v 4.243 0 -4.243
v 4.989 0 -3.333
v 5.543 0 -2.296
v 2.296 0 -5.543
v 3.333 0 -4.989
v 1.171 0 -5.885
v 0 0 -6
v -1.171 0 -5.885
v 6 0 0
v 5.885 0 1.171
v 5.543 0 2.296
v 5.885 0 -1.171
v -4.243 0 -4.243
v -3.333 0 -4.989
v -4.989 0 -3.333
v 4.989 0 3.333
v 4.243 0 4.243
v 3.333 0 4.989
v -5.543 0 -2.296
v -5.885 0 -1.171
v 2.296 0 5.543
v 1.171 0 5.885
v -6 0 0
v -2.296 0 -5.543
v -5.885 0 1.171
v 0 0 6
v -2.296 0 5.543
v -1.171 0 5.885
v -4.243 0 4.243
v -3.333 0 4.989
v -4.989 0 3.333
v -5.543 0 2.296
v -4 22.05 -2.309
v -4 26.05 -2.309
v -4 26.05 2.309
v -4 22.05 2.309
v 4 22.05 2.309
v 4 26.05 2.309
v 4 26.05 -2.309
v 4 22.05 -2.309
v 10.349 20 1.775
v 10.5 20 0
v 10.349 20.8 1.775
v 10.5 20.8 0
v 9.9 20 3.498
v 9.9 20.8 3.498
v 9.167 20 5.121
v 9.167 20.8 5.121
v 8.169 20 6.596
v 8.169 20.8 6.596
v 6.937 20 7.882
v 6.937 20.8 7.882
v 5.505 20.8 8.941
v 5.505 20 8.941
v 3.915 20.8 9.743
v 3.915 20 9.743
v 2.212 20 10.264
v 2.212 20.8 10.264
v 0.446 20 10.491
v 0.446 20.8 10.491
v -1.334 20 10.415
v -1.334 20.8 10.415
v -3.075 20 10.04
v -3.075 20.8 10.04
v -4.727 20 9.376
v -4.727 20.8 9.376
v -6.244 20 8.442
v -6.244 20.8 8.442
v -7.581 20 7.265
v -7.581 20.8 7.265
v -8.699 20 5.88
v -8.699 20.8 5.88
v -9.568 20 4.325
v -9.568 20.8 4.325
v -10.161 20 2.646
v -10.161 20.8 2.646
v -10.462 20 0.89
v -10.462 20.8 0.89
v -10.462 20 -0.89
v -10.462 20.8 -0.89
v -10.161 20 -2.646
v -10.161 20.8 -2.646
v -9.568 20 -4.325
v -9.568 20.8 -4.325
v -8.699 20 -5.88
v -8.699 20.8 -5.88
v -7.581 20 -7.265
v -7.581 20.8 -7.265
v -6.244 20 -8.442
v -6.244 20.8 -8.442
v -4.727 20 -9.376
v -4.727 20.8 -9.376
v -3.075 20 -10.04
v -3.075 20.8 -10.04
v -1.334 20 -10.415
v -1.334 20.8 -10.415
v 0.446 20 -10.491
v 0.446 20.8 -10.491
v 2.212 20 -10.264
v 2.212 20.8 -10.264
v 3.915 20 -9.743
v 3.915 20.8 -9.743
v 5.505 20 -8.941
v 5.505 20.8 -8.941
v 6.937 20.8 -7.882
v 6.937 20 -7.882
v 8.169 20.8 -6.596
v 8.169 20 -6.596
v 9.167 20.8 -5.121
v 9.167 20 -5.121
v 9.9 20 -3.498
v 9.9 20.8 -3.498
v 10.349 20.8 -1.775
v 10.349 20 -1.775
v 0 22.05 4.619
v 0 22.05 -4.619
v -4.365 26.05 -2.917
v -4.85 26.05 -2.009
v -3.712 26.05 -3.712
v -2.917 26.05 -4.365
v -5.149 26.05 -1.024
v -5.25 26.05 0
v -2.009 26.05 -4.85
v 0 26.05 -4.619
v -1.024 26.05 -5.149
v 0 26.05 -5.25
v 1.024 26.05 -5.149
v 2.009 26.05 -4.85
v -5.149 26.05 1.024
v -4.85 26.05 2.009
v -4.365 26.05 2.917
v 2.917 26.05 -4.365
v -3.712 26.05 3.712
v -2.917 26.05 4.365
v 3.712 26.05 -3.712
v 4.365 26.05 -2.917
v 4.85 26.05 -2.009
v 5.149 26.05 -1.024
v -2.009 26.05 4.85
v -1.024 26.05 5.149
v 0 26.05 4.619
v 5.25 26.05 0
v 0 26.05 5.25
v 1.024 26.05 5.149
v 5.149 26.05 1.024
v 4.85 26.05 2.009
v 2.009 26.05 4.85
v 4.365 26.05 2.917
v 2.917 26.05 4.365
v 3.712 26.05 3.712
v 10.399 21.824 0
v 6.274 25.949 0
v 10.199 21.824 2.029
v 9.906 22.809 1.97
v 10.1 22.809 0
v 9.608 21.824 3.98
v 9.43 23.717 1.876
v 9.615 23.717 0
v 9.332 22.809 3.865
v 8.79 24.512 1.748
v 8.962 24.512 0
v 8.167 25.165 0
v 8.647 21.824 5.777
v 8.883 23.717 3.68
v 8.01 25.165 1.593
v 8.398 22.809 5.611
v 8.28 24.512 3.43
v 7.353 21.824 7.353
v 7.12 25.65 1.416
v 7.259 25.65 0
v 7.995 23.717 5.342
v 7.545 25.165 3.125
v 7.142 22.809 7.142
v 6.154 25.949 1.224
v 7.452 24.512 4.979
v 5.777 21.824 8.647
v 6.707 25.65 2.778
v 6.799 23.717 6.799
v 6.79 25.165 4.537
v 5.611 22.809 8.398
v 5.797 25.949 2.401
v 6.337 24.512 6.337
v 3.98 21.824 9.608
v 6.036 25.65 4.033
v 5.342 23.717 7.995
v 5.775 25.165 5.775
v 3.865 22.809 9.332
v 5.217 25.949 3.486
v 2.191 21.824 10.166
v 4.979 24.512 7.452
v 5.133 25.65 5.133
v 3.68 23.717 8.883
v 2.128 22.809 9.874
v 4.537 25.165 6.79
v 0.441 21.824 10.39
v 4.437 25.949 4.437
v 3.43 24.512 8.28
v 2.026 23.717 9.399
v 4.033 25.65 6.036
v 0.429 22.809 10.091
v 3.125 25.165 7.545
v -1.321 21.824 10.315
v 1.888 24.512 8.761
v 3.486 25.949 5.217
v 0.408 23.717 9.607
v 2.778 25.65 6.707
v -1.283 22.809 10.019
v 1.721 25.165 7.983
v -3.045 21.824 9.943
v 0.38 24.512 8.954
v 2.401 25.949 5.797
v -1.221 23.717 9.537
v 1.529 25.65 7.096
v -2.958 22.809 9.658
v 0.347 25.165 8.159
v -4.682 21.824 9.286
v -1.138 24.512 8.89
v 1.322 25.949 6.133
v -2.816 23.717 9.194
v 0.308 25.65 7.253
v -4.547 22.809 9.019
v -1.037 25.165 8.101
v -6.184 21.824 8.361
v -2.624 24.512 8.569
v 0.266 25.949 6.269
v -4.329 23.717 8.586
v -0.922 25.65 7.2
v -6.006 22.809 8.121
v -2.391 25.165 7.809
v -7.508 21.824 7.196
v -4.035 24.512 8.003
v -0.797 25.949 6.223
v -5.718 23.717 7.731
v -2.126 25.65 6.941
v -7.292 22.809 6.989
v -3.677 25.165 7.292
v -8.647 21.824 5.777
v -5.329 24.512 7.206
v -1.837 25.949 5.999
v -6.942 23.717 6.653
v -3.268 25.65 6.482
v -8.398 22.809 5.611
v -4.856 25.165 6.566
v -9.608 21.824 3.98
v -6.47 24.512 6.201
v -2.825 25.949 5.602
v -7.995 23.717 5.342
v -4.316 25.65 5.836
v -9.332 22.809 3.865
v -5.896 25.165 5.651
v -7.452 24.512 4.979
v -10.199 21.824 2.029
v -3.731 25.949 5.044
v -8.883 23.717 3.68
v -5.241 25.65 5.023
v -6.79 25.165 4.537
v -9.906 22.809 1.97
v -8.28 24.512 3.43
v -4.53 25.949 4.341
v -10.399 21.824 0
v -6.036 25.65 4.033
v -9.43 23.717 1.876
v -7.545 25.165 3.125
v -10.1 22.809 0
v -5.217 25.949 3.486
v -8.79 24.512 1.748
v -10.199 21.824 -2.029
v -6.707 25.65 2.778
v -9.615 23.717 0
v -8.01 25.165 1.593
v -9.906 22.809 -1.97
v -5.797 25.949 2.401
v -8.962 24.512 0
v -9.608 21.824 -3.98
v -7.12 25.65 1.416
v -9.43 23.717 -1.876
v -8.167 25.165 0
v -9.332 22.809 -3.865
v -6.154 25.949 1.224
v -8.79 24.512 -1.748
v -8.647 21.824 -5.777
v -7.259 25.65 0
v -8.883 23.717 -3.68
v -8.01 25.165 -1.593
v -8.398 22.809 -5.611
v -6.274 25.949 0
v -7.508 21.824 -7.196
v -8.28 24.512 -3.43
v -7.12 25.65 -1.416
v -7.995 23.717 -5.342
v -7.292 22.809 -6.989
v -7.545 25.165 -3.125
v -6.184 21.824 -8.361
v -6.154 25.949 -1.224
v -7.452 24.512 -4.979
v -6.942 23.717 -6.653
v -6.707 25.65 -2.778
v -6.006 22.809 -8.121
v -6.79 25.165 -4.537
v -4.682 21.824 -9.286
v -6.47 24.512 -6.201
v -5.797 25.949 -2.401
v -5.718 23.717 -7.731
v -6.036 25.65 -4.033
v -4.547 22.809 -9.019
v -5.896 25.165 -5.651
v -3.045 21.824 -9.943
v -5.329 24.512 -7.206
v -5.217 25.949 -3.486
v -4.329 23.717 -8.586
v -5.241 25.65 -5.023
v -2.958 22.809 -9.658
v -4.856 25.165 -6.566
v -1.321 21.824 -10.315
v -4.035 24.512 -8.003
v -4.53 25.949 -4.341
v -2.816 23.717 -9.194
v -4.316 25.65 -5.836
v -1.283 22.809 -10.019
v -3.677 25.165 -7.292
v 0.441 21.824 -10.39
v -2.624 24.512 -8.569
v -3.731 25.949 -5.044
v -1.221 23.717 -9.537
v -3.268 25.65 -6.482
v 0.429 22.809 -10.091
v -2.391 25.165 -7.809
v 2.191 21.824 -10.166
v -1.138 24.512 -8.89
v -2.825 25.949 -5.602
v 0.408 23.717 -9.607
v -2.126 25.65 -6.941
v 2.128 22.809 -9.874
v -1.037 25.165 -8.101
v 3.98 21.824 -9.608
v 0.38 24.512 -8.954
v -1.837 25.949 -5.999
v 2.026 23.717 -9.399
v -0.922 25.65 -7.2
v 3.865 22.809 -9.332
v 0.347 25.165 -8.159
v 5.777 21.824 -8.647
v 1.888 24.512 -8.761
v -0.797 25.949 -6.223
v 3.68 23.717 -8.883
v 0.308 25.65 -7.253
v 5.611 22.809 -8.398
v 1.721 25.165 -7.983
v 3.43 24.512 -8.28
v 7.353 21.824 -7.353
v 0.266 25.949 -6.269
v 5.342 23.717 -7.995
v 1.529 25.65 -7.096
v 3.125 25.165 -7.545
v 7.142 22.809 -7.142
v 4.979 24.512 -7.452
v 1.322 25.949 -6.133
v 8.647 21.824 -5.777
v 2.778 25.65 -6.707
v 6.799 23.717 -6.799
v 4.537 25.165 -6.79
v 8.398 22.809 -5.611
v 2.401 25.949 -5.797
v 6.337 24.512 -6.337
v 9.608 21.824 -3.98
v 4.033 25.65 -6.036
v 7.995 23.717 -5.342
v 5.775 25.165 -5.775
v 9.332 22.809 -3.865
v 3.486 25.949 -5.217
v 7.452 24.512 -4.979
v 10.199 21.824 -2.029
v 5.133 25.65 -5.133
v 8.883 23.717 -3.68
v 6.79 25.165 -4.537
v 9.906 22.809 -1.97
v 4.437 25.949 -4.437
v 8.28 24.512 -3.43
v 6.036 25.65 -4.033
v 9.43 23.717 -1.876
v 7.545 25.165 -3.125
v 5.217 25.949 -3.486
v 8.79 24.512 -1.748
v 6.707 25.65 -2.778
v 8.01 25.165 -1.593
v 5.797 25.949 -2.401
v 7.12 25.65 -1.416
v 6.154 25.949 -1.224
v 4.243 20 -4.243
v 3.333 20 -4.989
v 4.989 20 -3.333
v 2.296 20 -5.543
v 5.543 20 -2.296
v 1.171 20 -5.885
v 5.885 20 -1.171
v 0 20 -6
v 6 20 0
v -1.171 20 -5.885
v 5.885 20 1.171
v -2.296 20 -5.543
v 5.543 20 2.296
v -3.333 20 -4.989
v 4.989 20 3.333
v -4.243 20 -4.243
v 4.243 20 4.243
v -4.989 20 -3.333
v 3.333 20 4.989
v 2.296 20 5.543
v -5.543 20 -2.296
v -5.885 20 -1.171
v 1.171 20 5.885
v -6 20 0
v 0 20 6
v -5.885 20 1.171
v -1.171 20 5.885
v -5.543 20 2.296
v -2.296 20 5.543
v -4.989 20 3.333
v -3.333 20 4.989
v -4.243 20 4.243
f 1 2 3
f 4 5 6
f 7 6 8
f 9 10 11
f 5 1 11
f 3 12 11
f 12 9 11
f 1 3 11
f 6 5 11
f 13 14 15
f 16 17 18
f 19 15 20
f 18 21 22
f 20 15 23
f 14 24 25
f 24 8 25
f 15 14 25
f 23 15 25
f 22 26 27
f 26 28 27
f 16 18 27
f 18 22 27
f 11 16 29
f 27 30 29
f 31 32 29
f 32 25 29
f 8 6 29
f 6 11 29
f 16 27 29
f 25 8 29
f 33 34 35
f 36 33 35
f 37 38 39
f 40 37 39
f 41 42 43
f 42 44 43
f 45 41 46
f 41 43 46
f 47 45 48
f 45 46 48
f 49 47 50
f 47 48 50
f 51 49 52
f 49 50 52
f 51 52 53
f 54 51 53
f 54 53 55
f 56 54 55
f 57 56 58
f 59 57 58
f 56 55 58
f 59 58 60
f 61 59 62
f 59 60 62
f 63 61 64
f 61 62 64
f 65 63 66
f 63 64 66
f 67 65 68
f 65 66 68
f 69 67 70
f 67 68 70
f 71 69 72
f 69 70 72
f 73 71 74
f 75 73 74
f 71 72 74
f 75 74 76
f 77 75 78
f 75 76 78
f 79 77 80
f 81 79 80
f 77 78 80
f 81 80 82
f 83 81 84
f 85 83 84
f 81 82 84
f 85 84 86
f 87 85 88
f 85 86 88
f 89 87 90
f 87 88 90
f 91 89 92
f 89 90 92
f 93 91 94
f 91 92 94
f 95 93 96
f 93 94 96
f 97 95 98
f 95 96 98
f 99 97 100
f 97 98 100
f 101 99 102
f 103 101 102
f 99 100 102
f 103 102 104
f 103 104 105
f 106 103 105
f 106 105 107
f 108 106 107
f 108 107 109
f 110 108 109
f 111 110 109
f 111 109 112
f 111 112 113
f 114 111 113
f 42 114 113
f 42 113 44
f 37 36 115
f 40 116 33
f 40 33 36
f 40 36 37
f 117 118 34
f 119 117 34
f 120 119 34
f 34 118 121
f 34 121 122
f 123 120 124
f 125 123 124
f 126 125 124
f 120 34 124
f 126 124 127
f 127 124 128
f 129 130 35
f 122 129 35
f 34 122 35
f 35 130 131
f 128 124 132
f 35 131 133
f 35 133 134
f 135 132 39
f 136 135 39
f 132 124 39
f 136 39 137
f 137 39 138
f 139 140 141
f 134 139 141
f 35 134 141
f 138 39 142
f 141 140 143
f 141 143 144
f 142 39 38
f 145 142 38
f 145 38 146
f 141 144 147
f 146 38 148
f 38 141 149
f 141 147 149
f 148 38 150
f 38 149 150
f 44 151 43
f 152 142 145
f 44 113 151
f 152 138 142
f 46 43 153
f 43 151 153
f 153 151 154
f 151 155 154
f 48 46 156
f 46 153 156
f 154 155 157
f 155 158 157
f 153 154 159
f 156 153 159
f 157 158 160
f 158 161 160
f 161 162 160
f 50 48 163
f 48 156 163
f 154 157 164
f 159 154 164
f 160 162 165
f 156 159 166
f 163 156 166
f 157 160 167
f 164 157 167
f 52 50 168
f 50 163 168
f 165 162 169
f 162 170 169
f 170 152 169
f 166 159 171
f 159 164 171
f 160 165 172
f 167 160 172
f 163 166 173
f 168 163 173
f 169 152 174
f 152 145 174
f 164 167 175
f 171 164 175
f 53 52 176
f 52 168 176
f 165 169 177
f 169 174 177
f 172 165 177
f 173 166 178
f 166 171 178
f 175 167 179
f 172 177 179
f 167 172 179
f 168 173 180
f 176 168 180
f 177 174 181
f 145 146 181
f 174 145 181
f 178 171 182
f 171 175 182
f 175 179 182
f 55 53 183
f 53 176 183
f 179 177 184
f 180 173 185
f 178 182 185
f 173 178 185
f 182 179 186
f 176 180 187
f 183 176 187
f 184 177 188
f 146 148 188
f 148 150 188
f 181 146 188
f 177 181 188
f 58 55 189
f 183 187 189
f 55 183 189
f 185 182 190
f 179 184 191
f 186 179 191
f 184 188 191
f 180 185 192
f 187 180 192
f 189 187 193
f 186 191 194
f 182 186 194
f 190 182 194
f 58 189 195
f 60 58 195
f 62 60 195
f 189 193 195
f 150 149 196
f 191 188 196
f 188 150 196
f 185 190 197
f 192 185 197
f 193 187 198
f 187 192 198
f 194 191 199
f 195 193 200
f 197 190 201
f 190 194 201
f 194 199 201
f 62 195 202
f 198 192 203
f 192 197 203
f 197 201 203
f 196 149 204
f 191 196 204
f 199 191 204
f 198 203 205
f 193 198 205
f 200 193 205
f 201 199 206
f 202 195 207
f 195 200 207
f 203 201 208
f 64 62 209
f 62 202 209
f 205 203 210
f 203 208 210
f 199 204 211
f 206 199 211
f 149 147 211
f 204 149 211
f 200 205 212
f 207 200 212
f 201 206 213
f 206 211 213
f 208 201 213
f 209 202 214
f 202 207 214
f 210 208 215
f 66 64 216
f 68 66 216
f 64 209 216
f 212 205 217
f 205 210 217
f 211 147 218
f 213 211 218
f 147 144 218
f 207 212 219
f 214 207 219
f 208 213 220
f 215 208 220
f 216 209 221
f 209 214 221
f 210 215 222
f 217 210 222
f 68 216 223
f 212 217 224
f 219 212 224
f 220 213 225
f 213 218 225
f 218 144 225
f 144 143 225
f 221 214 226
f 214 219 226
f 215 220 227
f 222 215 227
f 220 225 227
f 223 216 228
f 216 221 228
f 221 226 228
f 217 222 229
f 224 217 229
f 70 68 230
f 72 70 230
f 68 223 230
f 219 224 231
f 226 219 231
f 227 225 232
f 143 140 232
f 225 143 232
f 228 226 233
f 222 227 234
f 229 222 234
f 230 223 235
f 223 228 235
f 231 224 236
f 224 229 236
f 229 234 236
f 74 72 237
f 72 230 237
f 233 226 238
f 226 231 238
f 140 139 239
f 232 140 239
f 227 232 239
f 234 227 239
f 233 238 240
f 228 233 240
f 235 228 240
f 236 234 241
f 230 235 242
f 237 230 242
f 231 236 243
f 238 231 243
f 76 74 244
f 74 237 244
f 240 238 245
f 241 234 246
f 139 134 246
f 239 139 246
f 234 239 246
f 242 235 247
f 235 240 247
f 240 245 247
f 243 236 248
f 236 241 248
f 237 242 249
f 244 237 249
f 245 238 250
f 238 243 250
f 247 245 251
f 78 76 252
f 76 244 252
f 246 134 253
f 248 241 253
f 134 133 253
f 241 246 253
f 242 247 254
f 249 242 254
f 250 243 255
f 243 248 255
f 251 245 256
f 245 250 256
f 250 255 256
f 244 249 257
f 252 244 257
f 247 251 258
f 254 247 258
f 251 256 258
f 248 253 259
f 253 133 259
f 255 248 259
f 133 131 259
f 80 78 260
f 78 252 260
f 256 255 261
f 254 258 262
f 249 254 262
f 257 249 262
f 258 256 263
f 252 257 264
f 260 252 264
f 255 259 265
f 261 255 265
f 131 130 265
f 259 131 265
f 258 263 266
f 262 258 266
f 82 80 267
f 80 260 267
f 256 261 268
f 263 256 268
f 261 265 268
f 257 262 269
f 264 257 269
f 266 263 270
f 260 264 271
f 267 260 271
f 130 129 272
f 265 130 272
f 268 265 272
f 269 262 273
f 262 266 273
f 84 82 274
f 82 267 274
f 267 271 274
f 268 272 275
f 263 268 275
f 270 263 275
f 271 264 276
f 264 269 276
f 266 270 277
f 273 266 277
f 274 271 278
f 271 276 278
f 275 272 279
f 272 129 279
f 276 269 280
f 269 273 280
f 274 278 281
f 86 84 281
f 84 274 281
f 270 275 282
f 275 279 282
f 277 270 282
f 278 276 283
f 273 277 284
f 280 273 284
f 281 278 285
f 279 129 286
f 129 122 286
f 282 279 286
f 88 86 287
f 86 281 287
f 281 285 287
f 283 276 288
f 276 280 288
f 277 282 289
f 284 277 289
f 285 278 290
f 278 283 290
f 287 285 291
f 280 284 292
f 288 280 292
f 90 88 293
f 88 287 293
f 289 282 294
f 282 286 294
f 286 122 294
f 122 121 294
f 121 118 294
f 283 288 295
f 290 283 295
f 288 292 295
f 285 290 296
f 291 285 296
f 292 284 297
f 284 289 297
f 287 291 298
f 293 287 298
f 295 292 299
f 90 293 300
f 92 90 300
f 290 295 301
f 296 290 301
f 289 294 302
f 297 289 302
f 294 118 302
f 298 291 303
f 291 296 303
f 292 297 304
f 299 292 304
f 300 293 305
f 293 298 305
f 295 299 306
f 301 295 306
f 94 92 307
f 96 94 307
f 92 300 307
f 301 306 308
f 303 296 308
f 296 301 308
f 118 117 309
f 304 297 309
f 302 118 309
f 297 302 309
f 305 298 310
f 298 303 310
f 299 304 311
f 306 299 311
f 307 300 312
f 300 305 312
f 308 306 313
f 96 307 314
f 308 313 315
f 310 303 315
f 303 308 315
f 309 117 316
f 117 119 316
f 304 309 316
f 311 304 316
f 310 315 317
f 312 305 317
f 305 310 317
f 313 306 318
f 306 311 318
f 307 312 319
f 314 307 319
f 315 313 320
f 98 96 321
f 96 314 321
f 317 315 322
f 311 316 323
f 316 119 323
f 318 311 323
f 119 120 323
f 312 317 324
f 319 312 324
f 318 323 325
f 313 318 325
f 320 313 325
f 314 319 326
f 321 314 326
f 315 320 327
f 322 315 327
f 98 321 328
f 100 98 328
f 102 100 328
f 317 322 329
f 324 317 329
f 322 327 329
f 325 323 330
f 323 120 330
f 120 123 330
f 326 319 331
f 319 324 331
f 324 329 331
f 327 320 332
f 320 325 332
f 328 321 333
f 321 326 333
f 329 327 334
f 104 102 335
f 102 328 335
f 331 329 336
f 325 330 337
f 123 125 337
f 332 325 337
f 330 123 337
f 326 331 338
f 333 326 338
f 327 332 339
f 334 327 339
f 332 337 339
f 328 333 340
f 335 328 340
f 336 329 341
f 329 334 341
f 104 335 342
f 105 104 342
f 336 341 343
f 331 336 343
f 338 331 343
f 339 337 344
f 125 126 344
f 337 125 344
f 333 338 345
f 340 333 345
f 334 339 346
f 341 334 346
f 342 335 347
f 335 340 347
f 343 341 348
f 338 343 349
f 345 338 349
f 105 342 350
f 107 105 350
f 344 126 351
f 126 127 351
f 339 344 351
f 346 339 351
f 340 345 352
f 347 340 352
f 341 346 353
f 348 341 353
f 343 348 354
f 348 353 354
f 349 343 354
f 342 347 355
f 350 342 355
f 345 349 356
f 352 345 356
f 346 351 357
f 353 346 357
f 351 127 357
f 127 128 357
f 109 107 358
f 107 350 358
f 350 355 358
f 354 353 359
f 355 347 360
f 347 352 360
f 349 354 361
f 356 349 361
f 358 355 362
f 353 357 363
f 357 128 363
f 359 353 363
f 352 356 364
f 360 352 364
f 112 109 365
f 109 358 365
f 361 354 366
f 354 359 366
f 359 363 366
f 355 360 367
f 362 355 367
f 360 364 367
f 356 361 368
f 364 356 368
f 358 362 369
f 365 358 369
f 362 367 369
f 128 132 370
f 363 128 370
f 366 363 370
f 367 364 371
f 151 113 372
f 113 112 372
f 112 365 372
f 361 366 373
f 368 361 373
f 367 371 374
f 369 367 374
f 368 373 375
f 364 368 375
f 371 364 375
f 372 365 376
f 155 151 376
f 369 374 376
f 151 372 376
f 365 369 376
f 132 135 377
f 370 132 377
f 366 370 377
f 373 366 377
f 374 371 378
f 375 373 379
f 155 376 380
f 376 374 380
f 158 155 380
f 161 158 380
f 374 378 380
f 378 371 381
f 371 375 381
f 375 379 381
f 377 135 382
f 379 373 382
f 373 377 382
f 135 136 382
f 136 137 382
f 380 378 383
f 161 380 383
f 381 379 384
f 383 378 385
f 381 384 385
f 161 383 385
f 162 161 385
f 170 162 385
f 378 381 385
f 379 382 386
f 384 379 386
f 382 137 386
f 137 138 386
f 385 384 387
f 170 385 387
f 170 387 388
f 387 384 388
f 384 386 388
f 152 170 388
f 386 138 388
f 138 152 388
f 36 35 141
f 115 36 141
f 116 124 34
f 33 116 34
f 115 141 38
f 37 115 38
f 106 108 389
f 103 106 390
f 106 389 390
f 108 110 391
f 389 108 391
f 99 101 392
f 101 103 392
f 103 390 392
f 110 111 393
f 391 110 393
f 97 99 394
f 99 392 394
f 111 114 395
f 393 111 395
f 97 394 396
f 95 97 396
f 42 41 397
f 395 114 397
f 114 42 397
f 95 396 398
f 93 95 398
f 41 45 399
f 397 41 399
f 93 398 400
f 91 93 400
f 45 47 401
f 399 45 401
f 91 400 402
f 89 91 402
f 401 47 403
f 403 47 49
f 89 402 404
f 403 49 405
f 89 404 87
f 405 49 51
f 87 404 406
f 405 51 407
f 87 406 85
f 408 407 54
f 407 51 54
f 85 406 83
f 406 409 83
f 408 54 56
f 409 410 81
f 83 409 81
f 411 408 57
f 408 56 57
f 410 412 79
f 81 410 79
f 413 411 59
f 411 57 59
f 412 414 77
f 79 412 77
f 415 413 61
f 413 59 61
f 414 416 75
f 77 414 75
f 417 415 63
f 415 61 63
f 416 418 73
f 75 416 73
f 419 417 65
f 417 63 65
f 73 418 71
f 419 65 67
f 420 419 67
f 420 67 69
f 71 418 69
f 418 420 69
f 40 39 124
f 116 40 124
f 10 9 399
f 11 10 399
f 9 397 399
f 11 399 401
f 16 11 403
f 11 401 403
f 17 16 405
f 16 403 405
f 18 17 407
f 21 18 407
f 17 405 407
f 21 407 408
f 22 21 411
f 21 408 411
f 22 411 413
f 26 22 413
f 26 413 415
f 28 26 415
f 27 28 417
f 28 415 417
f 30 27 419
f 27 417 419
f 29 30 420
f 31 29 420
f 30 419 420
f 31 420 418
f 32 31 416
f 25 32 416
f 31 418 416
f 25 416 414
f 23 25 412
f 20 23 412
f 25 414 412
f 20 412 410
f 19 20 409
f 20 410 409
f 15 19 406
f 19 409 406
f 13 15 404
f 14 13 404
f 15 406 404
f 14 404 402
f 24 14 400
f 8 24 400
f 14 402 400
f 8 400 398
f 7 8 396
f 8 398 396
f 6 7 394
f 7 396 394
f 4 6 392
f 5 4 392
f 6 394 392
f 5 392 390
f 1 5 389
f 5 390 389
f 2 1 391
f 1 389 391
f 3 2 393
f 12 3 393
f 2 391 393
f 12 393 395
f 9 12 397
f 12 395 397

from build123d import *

# Parameters (mm, degrees)
CORTE_EXTRUS_O1_DEPTH = 4


with BuildPart() as part:
    # Esboço1 → Revolução1 (revolve)
    with BuildSketch(Plane.XY):
        with BuildLine():
            Line((0, 0), (6, 0))
            Line((6, 0), (6, 20))
            Line((6, 20), (10.5, 20))
            Line((10.5, 20), (10.5, 20.8))
            ThreePointArc((10.5, 20.8), (8.962310601, 24.512310601), (5.25, 26.05))
            Line((5.25, 26.05), (0, 26.05))
            Line((0, 26.05), (0, 0))
        make_face()
    revolve(axis=Axis((0, 26.05, 0), (0, -1, 0)))

    # Esboço2 → Corte-extrusão1 (cut)
    with BuildSketch(Plane(origin=(0, 26.05, 0), x_dir=(1, 0, 0), z_dir=(0, 1, 0))):
        Polygon((-4, -2.309401077), (0, -4.618802154), (4, -2.309401077), (4, 2.309401077), (0, 4.618802154), (-4, 2.309401077), align=None)
    extrude(amount=-CORTE_EXTRUS_O1_DEPTH, mode=Mode.SUBTRACT)


solid = part.part
